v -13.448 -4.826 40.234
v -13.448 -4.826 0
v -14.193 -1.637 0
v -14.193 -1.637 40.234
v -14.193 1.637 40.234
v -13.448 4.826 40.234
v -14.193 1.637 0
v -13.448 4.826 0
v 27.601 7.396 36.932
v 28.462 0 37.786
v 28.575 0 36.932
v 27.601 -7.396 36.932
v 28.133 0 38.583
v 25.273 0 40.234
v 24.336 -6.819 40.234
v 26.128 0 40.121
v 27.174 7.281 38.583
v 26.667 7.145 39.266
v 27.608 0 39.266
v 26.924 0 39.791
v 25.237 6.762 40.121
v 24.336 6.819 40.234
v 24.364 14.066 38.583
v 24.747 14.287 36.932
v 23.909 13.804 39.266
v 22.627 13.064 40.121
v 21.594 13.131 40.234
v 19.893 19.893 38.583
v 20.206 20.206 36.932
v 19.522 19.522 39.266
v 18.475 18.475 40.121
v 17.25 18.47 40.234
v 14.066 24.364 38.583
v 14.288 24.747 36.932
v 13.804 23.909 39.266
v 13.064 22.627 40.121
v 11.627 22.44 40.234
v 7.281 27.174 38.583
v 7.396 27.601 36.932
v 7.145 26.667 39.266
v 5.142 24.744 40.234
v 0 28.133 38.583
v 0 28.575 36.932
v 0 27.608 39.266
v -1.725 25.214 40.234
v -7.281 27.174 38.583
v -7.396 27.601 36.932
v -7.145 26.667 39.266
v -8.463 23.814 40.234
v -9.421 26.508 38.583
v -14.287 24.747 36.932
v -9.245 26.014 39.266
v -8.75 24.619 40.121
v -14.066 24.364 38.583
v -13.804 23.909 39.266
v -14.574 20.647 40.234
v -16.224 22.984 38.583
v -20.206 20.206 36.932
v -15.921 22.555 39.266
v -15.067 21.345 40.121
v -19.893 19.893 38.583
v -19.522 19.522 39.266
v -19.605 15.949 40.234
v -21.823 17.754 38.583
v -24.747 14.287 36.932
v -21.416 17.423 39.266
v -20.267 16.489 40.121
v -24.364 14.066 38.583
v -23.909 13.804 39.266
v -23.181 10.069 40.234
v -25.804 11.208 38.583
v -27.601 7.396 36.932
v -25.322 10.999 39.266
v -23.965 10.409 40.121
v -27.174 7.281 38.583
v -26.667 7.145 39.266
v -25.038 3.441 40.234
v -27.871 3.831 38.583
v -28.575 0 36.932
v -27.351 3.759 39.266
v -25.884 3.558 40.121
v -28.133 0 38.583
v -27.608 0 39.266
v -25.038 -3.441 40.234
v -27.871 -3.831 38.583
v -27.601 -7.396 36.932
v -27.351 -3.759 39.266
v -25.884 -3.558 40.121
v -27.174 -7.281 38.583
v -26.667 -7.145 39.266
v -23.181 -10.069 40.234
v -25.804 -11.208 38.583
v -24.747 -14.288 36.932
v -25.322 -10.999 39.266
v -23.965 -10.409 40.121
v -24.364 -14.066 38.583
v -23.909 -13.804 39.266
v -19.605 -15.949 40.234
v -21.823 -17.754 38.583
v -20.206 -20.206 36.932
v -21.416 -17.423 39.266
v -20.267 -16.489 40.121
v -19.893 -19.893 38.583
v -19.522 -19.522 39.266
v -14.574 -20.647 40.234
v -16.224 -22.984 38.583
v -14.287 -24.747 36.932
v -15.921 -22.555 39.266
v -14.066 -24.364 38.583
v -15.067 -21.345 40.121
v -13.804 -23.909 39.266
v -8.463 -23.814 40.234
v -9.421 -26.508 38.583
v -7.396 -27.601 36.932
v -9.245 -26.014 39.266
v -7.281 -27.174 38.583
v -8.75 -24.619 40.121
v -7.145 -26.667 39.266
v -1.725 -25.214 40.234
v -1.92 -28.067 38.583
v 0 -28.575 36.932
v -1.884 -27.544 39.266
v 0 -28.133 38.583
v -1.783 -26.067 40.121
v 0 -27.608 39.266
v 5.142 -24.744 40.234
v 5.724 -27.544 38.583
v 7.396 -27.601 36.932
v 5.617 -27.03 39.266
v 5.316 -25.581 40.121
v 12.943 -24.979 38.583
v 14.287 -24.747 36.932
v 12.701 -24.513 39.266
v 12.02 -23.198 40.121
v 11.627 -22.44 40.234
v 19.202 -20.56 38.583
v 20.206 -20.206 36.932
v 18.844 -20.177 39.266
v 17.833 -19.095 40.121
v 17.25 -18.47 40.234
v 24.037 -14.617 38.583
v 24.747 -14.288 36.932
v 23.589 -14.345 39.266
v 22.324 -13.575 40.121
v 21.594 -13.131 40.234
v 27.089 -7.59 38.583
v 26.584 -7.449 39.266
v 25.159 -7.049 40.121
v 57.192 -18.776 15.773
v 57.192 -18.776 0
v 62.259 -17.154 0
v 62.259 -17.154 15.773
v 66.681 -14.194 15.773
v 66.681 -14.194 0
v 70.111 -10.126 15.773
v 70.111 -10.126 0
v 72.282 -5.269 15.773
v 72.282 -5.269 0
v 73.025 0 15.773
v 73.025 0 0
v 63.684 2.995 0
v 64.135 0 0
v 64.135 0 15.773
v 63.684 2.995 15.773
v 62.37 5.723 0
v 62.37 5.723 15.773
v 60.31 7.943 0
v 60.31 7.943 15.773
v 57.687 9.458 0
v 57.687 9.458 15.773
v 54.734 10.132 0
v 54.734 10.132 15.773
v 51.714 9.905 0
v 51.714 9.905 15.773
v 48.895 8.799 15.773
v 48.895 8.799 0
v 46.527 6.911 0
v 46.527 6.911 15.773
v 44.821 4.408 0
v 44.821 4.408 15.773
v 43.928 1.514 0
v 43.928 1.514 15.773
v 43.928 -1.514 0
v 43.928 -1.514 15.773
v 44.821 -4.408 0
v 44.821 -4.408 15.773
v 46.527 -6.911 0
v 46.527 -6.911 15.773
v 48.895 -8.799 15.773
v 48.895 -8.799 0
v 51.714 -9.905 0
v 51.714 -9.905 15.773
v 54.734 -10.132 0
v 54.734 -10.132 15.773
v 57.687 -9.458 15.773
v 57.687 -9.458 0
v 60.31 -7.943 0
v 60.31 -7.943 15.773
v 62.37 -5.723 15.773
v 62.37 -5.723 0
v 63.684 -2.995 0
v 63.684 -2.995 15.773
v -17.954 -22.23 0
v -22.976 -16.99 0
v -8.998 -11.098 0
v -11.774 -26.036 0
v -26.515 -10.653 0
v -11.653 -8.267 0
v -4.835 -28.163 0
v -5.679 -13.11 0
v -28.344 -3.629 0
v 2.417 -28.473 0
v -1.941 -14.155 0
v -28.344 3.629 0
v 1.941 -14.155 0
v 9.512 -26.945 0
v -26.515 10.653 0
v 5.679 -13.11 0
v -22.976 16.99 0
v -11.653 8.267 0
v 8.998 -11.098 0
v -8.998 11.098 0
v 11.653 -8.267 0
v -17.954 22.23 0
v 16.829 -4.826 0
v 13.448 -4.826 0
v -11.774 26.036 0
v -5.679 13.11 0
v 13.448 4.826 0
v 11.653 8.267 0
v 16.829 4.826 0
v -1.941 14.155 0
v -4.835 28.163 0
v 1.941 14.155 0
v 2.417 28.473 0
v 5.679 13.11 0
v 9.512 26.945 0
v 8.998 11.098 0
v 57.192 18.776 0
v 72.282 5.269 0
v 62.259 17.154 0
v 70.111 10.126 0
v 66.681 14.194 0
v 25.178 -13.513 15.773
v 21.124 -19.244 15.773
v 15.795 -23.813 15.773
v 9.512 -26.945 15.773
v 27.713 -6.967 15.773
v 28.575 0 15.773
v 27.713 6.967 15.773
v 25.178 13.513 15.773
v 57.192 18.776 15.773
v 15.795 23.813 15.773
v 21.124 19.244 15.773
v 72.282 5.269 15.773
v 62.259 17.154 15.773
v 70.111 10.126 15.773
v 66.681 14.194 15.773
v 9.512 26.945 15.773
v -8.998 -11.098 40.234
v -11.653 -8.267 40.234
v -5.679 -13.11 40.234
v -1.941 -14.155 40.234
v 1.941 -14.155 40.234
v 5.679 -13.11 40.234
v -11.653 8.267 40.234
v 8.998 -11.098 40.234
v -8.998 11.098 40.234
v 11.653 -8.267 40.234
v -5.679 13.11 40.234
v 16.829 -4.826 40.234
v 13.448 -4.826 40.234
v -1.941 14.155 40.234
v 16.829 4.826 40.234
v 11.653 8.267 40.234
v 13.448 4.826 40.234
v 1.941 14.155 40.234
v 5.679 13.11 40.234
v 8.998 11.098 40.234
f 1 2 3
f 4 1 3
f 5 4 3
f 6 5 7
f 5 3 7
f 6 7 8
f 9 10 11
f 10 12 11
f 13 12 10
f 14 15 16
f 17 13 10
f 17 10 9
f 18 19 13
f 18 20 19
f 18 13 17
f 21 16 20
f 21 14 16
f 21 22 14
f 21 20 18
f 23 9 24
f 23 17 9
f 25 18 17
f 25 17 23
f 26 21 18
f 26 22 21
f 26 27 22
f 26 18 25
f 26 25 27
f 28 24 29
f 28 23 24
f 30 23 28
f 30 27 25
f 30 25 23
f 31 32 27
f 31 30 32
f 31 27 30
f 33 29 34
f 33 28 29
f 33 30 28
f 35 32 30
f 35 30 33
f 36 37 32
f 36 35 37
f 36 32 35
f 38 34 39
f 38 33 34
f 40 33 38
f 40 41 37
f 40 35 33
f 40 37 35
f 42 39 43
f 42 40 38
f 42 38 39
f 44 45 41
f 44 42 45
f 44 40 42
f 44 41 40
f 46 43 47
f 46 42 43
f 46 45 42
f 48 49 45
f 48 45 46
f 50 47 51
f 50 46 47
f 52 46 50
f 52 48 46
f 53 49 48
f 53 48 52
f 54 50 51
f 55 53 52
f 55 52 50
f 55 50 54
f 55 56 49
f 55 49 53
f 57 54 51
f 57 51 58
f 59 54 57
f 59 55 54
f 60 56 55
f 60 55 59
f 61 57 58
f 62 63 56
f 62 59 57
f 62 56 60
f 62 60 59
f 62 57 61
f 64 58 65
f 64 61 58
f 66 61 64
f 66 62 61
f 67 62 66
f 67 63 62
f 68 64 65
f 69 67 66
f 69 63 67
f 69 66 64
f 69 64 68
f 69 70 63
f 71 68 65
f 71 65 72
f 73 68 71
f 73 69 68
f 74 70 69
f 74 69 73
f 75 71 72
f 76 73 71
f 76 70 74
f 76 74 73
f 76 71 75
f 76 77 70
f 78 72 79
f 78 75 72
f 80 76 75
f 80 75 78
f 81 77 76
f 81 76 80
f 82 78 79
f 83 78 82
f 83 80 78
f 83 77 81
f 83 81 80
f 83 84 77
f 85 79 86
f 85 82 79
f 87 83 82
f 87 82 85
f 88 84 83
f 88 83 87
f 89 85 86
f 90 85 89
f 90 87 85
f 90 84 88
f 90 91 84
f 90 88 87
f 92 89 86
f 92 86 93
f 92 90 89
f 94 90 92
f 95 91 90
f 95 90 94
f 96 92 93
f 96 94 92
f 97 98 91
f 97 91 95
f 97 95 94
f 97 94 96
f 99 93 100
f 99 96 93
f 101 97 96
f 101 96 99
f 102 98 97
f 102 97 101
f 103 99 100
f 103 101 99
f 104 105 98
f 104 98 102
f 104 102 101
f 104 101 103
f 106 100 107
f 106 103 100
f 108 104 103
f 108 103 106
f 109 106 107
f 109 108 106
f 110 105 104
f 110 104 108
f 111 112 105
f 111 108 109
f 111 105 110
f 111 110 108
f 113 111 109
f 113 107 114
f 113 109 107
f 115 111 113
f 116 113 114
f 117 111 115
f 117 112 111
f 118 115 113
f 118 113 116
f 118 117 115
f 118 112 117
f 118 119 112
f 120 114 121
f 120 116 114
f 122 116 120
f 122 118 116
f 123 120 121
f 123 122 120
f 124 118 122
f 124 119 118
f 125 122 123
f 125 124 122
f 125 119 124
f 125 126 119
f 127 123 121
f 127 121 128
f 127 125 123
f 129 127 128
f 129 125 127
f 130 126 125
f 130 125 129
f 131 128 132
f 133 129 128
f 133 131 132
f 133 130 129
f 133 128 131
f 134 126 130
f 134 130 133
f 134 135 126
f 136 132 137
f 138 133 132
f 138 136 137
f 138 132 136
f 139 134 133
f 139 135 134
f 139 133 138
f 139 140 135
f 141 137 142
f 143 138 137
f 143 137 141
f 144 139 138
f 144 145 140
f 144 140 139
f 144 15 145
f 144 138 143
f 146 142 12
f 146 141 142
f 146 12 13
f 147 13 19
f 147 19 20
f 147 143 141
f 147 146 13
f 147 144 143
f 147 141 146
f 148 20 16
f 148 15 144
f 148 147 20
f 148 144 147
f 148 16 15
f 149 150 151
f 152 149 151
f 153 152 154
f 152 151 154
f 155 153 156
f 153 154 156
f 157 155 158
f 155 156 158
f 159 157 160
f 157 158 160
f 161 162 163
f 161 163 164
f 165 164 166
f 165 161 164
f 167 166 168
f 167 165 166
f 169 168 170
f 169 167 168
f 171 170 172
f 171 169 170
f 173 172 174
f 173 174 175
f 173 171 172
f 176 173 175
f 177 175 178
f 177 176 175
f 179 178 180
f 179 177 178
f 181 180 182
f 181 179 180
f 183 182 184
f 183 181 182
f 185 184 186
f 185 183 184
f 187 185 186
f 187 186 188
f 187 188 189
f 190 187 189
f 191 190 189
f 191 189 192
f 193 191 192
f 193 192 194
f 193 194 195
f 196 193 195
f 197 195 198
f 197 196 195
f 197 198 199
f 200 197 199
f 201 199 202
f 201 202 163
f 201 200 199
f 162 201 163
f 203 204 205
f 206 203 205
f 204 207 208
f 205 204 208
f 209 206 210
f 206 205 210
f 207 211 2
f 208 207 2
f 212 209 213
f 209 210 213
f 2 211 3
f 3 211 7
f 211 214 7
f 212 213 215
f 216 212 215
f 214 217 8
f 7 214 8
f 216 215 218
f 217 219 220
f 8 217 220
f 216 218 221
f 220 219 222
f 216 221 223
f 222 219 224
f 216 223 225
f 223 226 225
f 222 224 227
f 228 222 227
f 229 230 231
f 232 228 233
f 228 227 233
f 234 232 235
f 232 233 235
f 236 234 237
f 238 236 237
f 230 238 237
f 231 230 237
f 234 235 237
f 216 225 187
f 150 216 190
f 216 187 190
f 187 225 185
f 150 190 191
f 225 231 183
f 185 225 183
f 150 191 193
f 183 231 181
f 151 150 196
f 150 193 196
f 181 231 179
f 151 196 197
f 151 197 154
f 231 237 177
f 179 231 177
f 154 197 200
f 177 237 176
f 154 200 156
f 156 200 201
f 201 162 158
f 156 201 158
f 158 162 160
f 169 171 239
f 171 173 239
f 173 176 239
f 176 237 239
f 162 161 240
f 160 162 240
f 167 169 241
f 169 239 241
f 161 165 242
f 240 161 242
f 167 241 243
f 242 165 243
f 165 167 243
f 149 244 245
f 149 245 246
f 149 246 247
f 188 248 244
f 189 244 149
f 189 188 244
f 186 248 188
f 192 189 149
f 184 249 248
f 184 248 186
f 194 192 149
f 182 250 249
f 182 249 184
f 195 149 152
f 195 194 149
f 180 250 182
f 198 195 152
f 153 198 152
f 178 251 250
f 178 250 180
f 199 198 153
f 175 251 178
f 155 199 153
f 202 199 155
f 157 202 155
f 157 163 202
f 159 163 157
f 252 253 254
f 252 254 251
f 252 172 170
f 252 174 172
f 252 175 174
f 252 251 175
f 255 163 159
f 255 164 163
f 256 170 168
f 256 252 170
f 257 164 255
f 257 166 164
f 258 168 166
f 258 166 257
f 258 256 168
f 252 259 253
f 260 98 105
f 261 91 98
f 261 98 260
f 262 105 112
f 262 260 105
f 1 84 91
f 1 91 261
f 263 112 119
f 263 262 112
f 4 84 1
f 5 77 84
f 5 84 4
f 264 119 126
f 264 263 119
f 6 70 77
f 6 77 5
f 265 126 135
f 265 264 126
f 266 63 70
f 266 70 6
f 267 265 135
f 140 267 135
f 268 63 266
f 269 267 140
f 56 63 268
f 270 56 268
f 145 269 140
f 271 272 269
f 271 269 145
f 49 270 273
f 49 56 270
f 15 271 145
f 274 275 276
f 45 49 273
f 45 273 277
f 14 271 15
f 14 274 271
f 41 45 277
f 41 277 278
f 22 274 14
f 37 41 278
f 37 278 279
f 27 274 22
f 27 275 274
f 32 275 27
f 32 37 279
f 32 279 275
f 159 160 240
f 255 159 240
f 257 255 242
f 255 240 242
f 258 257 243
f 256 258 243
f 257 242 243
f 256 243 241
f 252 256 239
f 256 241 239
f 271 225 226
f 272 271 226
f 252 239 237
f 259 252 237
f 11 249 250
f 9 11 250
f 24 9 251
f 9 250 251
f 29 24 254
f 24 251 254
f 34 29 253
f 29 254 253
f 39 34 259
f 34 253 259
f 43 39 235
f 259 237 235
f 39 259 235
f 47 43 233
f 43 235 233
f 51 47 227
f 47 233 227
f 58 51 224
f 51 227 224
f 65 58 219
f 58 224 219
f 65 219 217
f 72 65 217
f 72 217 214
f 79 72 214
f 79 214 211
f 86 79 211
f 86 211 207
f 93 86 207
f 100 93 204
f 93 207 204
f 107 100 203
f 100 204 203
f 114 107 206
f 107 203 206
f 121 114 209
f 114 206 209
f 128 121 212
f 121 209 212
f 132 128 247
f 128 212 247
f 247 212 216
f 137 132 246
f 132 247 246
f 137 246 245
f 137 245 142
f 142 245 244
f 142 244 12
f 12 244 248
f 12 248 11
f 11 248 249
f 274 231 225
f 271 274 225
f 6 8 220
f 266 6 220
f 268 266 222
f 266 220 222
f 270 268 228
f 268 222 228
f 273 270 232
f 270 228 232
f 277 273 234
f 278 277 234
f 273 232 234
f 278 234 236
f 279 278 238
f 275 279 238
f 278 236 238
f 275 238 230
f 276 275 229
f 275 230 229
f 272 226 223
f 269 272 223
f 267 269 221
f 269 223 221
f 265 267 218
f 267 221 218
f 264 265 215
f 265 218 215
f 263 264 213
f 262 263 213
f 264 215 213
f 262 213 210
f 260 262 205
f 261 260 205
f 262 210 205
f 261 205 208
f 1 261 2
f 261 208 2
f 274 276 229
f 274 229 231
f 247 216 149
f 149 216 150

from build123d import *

# Parameters (mm, degrees)
F0_R     = 28.575
F1_DEPTH = 40.2336
F2_R     = 10.16
F3_DEPTH = 15.7734
F4_DEPTH = 25.4
F5_R     = 3.302


with BuildPart() as f1:
    # F0 (on Top) → F1 (new body)
    with BuildSketch(Plane.XY):
        Circle(F0_R)
        with BuildLine():
            ThreePointArc((-13.4477648793, -4.826), (-14.2875, 0), (-13.4477648793, 4.826))
            ThreePointArc((-13.4477648793, 4.826), (0, 14.2875), (13.4477648793, 4.826))
            Line((13.4477648793, 4.826), (16.8290351207, 4.826))
            Line((16.8290351207, 4.826), (16.8290351207, -4.826))
            Line((16.8290351207, -4.826), (13.4477648793, -4.826))
            ThreePointArc((13.4477648793, -4.826), (0, -14.2875), (-13.4477648793, -4.826))
        make_face(mode=Mode.SUBTRACT)
    extrude(amount=F1_DEPTH)

    # F2 (on Top) → F3 (join)
    with BuildSketch(Plane.XY):
        with BuildLine():
            ThreePointArc((57.1919272622, -18.7764181619), (34.925, 0), (57.1919272622, 18.7764181619))
            Line((57.1919272622, 18.7764181619), (9.5121844836, 26.9452959039))
            ThreePointArc((9.5121844836, 26.9452959039), (23.3274655355, 16.5033322905), (28.575, 0))
            ThreePointArc((28.575, 0), (23.3274655355, -16.5033322905), (9.5121844836, -26.9452959039))
            Line((9.5121844836, -26.9452959039), (57.1919272622, -18.7764181619))
        make_face()
        with BuildLine():
            ThreePointArc((57.1919272622, -18.7764181619), (68.5383952831, -12.2804730295), (73.025, 0))
            ThreePointArc((73.025, 0), (68.5383952831, 12.2804730295), (57.1919272622, 18.7764181619))
            ThreePointArc((57.1919272622, 18.7764181619), (34.925, 0), (57.1919272622, -18.7764181619))
        make_face()
        with Locations((53.975, 0)):
            Circle(F2_R, mode=Mode.SUBTRACT)
    extrude(amount=F3_DEPTH)

    # F0 (on Top) → F4 (join)
    with BuildSketch(Plane.XY):
        Circle(F0_R)
        with BuildLine():
            ThreePointArc((-13.4477648793, -4.826), (-14.2875, 0), (-13.4477648793, 4.826))
            ThreePointArc((-13.4477648793, 4.826), (0, 14.2875), (13.4477648793, 4.826))
            Line((13.4477648793, 4.826), (16.8290351207, 4.826))
            Line((16.8290351207, 4.826), (16.8290351207, -4.826))
            Line((16.8290351207, -4.826), (13.4477648793, -4.826))
            ThreePointArc((13.4477648793, -4.826), (0, -14.2875), (-13.4477648793, -4.826))
        make_face(mode=Mode.SUBTRACT)
    extrude(amount=F4_DEPTH)

    # F5
    f5_edges = [f1.edges().sort_by_distance(p)[0] for p in [
        (-28.575, 0, 40.2336),
    ]]
    fillet(f5_edges, radius=F5_R)


solid = f1.part
